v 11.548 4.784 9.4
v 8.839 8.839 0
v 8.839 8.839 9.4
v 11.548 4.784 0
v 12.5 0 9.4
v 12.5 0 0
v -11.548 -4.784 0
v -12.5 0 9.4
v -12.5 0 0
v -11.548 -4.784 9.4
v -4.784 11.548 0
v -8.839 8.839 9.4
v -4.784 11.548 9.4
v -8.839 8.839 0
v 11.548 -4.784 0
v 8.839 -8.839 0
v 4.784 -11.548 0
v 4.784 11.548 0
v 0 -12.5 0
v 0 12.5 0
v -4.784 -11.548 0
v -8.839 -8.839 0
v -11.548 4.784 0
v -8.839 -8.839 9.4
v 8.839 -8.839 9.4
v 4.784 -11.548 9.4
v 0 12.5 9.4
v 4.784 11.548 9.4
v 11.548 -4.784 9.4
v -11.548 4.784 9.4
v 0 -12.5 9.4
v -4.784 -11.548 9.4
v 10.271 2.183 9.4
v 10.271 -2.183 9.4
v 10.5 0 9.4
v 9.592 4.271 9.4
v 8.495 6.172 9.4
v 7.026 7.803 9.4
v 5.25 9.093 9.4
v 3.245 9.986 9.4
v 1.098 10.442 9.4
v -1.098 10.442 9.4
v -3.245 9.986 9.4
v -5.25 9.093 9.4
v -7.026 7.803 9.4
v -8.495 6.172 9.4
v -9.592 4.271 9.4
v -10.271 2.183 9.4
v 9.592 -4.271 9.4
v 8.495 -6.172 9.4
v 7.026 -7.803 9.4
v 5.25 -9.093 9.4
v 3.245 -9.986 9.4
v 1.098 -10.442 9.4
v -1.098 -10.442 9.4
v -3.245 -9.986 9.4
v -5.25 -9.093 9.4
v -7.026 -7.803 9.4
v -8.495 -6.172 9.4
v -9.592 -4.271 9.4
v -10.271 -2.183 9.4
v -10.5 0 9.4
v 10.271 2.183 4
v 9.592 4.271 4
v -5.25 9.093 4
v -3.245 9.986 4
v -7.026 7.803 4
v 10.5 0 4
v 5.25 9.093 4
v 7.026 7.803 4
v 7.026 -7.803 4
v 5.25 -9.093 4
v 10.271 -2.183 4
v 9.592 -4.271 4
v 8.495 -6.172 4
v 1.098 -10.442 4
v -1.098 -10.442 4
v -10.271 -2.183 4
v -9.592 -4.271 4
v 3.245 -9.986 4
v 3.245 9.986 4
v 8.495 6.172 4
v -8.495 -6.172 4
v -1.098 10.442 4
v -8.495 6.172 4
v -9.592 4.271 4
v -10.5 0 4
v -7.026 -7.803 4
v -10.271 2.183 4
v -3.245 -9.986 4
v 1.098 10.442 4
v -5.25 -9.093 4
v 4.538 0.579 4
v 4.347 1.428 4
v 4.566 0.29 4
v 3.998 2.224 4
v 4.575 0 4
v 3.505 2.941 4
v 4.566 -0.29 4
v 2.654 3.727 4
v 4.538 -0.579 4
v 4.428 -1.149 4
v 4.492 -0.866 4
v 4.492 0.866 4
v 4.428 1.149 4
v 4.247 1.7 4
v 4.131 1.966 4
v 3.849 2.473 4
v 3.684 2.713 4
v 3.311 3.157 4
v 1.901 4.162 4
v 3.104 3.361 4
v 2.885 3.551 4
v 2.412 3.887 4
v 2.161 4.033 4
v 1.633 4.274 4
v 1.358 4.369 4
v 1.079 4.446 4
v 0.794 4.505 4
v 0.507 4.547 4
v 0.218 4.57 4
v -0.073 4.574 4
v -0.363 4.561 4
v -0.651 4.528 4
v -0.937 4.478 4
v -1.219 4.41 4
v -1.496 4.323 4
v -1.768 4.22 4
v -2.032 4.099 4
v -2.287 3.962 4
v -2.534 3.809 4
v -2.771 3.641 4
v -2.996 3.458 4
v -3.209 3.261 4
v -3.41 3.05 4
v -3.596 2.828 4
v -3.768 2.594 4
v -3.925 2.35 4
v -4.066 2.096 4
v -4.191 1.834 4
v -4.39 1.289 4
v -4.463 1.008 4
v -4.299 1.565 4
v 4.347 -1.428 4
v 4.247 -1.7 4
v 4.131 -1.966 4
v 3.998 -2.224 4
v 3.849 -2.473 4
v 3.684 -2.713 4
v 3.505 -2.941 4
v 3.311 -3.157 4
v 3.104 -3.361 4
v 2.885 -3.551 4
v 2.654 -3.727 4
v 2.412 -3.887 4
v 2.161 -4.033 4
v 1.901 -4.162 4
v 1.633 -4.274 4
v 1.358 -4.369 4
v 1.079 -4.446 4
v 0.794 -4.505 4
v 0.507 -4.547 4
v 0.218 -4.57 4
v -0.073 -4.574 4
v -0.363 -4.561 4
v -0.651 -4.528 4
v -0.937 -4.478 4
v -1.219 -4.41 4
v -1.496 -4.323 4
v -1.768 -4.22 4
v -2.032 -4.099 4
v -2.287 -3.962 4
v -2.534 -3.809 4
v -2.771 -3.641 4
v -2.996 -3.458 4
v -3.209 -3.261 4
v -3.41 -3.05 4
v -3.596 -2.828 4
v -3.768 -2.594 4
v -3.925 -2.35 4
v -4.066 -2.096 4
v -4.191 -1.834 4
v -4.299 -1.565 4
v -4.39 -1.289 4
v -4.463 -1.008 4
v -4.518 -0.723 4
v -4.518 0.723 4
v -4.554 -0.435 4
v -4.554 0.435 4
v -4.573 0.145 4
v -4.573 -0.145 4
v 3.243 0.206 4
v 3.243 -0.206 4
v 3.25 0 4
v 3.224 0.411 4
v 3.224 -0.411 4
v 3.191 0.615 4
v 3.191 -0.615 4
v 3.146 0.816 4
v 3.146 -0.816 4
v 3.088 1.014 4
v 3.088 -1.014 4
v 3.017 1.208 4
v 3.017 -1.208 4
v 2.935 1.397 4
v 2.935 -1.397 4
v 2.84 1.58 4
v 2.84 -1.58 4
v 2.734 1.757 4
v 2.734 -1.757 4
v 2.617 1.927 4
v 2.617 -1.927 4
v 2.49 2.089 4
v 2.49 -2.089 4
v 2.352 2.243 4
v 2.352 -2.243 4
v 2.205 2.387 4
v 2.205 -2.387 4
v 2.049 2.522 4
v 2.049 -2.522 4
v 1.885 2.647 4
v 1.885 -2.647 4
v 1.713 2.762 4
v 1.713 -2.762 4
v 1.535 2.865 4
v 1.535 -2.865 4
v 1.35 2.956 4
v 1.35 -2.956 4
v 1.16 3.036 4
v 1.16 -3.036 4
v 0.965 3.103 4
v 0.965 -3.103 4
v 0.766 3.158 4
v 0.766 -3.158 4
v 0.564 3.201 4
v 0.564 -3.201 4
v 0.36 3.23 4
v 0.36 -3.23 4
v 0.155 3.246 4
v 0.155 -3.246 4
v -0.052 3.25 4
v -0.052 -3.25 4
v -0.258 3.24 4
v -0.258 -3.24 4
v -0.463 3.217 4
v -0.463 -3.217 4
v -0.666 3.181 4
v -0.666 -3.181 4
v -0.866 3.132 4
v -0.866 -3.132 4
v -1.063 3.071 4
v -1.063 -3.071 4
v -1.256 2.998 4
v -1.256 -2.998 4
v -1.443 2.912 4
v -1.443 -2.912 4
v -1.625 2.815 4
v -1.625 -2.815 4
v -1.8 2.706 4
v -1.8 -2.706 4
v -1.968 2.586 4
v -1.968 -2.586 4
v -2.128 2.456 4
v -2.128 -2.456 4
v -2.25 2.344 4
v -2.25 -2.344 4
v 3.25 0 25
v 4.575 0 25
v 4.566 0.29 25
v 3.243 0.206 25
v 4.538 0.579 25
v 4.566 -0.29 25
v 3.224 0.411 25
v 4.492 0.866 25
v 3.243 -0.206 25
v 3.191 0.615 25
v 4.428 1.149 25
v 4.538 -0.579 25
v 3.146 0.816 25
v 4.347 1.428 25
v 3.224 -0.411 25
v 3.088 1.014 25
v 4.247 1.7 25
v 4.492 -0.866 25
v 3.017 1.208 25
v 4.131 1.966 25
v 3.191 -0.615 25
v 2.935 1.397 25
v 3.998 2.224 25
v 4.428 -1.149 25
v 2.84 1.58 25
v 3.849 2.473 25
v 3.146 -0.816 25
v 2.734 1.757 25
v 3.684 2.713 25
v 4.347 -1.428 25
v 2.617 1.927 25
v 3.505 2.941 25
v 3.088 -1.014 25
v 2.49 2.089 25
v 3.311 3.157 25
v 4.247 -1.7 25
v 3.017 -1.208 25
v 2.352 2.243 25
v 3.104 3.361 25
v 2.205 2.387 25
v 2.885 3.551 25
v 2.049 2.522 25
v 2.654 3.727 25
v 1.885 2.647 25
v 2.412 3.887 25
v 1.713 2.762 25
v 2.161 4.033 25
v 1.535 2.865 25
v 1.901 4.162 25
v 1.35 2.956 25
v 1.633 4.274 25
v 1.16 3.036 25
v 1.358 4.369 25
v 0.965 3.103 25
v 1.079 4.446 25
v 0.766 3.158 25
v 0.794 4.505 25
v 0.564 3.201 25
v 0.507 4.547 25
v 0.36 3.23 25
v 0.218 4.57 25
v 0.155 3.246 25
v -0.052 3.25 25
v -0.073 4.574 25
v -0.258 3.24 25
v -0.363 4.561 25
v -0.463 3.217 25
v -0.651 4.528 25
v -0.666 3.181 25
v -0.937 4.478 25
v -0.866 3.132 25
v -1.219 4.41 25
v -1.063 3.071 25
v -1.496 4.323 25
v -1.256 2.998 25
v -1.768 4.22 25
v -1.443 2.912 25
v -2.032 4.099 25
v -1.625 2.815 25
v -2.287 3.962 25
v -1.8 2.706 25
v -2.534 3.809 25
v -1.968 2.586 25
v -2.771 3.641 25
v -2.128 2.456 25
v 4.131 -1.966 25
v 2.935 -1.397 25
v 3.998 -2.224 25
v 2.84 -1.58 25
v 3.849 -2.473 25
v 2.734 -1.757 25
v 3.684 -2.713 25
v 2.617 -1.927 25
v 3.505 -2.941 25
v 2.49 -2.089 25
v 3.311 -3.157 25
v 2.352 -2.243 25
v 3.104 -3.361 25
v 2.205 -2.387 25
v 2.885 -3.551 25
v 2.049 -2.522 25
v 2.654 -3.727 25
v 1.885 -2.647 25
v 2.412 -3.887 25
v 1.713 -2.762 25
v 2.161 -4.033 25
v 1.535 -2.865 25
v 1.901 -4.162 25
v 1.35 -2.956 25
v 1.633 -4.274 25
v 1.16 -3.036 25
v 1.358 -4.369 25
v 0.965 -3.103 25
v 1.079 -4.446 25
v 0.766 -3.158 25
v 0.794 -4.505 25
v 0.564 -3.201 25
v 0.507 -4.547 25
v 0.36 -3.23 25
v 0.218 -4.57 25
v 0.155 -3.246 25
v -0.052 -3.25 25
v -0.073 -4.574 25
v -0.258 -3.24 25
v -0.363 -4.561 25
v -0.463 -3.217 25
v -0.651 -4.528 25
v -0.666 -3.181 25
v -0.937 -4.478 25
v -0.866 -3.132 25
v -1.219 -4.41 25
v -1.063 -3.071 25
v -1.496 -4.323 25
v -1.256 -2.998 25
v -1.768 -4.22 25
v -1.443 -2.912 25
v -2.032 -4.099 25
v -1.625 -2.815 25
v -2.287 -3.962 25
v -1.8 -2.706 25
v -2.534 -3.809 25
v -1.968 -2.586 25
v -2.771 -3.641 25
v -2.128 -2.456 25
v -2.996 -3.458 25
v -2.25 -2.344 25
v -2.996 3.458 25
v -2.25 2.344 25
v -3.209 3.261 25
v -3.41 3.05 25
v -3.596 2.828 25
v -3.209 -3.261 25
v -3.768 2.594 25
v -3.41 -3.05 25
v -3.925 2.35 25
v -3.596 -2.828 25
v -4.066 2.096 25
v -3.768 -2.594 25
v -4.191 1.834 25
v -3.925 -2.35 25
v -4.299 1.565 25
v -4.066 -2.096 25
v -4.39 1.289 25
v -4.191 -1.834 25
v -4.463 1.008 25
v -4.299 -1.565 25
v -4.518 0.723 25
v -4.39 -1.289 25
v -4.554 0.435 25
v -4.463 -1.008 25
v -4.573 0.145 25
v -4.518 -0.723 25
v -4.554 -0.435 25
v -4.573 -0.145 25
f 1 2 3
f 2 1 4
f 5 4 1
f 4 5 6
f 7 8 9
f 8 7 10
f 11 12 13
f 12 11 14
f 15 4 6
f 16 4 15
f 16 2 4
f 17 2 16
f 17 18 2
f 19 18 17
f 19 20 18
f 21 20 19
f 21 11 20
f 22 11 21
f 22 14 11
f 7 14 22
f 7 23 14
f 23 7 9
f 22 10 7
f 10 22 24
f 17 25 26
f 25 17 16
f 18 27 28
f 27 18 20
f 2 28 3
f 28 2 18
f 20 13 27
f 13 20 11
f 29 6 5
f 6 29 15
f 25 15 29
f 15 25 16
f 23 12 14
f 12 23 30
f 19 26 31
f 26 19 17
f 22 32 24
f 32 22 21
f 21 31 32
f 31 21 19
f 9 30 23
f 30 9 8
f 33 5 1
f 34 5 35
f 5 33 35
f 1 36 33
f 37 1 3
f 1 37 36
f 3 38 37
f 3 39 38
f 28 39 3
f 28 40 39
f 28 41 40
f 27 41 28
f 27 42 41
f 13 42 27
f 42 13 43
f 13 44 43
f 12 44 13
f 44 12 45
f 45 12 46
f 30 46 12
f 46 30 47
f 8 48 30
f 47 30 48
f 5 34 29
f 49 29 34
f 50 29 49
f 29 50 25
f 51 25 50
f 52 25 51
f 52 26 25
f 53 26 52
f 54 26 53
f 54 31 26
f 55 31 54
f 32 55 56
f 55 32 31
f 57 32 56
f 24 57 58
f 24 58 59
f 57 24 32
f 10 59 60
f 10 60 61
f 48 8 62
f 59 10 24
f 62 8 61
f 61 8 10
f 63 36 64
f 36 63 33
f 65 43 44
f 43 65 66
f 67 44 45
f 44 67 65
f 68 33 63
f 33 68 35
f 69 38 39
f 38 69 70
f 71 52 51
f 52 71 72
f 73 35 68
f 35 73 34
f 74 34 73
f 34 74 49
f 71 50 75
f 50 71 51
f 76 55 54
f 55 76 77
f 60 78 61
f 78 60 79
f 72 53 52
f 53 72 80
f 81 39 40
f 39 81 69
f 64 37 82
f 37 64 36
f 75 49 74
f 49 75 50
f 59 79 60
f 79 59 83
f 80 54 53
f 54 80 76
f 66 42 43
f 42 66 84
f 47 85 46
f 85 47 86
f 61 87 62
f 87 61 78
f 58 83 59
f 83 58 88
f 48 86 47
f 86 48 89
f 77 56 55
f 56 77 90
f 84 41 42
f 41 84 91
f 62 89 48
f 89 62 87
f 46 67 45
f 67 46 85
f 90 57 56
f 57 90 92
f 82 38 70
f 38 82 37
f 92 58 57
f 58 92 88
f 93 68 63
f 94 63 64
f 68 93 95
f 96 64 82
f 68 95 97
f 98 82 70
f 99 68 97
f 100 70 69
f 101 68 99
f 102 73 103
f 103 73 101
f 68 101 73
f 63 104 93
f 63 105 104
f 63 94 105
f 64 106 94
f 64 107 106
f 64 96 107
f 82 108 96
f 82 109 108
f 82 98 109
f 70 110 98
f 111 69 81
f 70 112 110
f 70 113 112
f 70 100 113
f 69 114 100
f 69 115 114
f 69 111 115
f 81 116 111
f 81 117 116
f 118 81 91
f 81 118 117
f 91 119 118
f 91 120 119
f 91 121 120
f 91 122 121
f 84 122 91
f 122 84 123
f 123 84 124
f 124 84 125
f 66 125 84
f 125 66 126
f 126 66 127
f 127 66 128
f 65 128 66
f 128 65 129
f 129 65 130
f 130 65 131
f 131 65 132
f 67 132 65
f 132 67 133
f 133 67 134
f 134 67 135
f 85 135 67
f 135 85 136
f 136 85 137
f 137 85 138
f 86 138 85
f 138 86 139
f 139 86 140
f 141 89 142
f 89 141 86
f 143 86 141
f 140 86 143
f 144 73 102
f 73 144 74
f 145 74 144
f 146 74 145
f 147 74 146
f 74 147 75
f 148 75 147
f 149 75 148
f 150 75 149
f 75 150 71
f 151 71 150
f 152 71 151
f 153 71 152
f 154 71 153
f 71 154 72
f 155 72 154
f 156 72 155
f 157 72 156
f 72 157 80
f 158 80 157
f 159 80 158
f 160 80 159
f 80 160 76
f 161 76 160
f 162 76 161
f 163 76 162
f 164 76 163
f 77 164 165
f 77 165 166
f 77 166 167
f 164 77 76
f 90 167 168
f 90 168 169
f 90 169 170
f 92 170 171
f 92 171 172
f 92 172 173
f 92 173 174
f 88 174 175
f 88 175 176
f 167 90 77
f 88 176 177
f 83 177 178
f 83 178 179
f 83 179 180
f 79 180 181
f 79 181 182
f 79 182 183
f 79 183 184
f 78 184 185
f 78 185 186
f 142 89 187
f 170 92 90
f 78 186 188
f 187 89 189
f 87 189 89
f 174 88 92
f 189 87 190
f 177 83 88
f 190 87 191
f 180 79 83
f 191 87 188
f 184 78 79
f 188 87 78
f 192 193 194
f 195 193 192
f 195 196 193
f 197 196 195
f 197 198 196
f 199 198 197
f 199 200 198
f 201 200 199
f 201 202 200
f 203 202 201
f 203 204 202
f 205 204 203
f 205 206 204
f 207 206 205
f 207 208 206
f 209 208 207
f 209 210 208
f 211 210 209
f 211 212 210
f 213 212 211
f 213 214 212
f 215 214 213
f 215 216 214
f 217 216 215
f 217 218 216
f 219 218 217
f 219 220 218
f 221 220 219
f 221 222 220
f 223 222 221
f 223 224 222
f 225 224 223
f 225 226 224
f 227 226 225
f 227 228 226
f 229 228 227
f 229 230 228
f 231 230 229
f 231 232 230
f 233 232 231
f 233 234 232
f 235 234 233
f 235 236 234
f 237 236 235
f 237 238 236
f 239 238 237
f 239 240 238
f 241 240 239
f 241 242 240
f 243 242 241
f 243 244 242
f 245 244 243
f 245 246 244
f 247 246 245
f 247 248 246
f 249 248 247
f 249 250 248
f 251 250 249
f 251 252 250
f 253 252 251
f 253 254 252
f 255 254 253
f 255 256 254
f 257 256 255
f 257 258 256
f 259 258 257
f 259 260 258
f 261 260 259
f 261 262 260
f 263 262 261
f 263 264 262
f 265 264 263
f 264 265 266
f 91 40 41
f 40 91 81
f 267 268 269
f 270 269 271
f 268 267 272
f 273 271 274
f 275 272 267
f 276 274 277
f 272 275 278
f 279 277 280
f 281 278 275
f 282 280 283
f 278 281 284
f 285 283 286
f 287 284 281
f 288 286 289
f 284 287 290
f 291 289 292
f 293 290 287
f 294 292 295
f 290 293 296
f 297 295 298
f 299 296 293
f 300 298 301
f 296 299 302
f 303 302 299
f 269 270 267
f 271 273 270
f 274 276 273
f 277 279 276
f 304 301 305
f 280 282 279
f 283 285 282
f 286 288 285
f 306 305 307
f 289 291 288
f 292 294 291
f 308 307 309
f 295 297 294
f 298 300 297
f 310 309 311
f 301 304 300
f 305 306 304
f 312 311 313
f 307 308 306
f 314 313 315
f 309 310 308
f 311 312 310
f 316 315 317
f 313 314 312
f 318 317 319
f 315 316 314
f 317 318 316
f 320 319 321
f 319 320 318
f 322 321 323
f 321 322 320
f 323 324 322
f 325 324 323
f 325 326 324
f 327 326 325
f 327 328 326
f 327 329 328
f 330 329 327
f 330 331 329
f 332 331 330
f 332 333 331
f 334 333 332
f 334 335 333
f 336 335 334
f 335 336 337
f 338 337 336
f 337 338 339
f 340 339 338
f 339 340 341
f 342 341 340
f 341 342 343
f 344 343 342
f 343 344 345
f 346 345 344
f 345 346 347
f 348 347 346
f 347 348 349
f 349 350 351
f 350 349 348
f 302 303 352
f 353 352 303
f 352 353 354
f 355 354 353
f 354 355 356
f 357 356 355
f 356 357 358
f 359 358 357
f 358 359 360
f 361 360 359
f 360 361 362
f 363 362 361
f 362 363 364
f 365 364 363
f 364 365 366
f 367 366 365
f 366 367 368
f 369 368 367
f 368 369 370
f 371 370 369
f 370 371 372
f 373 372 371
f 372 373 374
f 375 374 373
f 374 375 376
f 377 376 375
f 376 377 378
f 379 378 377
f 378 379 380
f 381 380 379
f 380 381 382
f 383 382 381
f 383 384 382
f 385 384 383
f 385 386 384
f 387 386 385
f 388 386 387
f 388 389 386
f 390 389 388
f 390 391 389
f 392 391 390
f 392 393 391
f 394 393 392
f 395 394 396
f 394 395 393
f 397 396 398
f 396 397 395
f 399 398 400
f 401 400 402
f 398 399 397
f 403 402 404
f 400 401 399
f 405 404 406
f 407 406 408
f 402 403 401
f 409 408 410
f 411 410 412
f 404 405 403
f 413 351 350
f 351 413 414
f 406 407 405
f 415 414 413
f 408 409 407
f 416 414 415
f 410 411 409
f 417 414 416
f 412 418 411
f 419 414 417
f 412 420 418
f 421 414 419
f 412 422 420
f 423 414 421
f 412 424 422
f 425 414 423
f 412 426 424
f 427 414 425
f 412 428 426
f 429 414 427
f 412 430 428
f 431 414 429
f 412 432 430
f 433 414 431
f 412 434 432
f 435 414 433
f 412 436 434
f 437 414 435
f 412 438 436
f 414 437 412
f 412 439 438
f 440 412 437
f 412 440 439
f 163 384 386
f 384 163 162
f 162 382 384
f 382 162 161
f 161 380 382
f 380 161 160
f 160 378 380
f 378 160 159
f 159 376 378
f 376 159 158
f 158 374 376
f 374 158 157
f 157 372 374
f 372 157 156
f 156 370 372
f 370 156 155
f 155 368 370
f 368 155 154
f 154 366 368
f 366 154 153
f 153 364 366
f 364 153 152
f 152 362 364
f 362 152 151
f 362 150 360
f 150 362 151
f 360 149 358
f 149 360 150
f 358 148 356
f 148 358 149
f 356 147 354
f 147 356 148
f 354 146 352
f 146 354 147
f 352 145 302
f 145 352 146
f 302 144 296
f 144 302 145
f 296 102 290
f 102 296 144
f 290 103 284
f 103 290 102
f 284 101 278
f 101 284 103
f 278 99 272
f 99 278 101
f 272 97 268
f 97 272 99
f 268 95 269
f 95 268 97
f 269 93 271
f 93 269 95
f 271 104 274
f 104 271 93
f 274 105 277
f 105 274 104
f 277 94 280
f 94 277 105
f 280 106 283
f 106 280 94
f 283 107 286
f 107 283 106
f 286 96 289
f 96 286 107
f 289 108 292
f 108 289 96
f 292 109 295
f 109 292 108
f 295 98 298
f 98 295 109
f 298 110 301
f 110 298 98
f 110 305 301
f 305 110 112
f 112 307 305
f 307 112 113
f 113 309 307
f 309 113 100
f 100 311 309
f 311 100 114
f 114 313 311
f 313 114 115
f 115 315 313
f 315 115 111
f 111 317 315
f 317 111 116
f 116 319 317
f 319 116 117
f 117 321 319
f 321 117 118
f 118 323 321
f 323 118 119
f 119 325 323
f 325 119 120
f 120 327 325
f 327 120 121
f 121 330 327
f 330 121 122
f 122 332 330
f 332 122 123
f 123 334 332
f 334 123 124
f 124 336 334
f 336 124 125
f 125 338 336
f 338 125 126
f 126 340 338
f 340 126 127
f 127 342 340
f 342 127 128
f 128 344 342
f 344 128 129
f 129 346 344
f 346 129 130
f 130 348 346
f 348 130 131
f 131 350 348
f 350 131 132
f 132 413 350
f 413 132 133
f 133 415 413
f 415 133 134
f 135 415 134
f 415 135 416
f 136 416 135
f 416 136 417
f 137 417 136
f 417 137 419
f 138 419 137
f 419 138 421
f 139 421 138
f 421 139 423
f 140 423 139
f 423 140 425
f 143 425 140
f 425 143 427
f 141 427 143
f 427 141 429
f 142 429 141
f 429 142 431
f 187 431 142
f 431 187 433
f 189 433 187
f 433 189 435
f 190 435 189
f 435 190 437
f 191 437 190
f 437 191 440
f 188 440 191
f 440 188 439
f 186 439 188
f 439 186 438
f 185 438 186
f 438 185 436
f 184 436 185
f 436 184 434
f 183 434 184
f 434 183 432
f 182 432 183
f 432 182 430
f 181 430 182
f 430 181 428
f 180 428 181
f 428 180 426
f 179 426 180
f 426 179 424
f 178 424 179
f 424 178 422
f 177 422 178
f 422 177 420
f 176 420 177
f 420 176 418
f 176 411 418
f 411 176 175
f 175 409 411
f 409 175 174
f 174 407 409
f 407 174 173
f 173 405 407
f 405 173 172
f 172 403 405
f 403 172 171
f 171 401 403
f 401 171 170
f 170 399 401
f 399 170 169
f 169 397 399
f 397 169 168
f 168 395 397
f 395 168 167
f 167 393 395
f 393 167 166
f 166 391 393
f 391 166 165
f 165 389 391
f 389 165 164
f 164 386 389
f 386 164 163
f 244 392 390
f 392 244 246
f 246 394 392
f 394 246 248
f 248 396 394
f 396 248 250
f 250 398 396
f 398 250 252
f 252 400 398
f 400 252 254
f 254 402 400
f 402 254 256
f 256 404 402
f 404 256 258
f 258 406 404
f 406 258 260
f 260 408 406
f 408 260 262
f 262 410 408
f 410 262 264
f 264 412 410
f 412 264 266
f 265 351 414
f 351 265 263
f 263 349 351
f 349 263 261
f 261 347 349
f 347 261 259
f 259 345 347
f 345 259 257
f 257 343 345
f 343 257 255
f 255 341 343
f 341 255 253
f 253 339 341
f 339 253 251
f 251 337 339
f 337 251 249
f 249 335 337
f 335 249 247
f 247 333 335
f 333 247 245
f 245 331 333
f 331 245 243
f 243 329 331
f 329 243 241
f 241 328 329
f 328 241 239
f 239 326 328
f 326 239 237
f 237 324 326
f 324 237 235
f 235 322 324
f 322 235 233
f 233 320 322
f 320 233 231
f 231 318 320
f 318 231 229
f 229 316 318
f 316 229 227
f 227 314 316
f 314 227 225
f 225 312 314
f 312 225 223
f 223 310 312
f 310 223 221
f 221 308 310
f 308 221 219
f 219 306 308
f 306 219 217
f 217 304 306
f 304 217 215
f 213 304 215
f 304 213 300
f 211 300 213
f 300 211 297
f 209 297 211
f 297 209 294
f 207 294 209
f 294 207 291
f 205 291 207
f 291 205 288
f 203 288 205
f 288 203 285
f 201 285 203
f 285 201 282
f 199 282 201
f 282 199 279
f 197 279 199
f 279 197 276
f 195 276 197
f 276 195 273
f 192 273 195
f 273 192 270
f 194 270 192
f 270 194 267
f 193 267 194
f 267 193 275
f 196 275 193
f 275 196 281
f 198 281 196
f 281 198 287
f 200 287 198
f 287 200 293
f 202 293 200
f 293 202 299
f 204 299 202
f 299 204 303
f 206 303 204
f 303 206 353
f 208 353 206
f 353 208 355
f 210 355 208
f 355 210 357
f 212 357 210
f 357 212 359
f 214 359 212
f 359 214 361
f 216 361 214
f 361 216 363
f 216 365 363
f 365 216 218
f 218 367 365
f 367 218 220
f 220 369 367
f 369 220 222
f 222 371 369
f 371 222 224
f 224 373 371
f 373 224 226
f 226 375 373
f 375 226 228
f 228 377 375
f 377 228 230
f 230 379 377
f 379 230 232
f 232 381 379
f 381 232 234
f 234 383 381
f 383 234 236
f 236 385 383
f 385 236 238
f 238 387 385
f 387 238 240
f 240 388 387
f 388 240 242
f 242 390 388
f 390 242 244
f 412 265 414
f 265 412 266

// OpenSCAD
// Baseboard heater knob

_KnobDiameter = 25.0;       // Knob diameter
_KnobWallThickness = 4.0;   // Knob wall thickness
_KnobHeight = 9.4;          // Knob height

_ShaftDiameter = 9.15;      // Shaft diameter // 9.2 measured, 9.15 test
_ShaftHeight = 21.0;        // Shaft height
_ShaftHoleDiameter = 6.50;  // Shaft hole diameter
_ShaftD = 5.5;                // Shaft D size (tried 4.9, 5.0, 5.25, 5.5)


module RenderKnob(KnobDiameter, KnobWallThickness, KnobHeight)
{
    difference()
    {   // Outside
        linear_extrude(KnobHeight)
        {
            circle(d=KnobDiameter, $fn=16);
        }
        // Inside
        translate([0, 0, KnobWallThickness])
        {
            linear_extrude(KnobHeight - KnobWallThickness)
            {
                circle(d=(KnobDiameter - KnobWallThickness));
            }
        }
     }
}

module RenderShaft(ShaftDiameter, ShaftHeight, ShaftHoleDiameter)
{
	linear_extrude(ShaftHeight)
	{
		difference()
		{
			// Matter
			union()
			{
				circle(d=ShaftDiameter, $fn=99);
			}
			
			// Antimatter
			circle(d=ShaftHoleDiameter, $fn=99);
		}
	}
}

module RenderD(Diameter, Height, D)
{
	linear_extrude(Height)
	{
		intersection()
		{
			circle(d=Diameter, $fn=99);
			translate([-D, 0, 0])
            {
                square(Diameter, center=true);
            }
		}
	}
}

module main(KnobDiameter, KnobWallThickness, KnobHeight, ShaftDiameter, ShaftHoleDiameter, ShaftHeight, ShaftD)
{
    union()
    {
        RenderKnob(KnobDiameter, KnobWallThickness, KnobHeight);
		translate([0, 0, KnobWallThickness])
		{
			RenderShaft(ShaftDiameter, ShaftHeight, ShaftHoleDiameter);
            RenderD(ShaftHoleDiameter, ShaftHeight, ShaftD); 
		}
    }
}

main(_KnobDiameter, _KnobWallThickness, _KnobHeight, _ShaftDiameter, _ShaftHoleDiameter, _ShaftHeight, _ShaftD);
